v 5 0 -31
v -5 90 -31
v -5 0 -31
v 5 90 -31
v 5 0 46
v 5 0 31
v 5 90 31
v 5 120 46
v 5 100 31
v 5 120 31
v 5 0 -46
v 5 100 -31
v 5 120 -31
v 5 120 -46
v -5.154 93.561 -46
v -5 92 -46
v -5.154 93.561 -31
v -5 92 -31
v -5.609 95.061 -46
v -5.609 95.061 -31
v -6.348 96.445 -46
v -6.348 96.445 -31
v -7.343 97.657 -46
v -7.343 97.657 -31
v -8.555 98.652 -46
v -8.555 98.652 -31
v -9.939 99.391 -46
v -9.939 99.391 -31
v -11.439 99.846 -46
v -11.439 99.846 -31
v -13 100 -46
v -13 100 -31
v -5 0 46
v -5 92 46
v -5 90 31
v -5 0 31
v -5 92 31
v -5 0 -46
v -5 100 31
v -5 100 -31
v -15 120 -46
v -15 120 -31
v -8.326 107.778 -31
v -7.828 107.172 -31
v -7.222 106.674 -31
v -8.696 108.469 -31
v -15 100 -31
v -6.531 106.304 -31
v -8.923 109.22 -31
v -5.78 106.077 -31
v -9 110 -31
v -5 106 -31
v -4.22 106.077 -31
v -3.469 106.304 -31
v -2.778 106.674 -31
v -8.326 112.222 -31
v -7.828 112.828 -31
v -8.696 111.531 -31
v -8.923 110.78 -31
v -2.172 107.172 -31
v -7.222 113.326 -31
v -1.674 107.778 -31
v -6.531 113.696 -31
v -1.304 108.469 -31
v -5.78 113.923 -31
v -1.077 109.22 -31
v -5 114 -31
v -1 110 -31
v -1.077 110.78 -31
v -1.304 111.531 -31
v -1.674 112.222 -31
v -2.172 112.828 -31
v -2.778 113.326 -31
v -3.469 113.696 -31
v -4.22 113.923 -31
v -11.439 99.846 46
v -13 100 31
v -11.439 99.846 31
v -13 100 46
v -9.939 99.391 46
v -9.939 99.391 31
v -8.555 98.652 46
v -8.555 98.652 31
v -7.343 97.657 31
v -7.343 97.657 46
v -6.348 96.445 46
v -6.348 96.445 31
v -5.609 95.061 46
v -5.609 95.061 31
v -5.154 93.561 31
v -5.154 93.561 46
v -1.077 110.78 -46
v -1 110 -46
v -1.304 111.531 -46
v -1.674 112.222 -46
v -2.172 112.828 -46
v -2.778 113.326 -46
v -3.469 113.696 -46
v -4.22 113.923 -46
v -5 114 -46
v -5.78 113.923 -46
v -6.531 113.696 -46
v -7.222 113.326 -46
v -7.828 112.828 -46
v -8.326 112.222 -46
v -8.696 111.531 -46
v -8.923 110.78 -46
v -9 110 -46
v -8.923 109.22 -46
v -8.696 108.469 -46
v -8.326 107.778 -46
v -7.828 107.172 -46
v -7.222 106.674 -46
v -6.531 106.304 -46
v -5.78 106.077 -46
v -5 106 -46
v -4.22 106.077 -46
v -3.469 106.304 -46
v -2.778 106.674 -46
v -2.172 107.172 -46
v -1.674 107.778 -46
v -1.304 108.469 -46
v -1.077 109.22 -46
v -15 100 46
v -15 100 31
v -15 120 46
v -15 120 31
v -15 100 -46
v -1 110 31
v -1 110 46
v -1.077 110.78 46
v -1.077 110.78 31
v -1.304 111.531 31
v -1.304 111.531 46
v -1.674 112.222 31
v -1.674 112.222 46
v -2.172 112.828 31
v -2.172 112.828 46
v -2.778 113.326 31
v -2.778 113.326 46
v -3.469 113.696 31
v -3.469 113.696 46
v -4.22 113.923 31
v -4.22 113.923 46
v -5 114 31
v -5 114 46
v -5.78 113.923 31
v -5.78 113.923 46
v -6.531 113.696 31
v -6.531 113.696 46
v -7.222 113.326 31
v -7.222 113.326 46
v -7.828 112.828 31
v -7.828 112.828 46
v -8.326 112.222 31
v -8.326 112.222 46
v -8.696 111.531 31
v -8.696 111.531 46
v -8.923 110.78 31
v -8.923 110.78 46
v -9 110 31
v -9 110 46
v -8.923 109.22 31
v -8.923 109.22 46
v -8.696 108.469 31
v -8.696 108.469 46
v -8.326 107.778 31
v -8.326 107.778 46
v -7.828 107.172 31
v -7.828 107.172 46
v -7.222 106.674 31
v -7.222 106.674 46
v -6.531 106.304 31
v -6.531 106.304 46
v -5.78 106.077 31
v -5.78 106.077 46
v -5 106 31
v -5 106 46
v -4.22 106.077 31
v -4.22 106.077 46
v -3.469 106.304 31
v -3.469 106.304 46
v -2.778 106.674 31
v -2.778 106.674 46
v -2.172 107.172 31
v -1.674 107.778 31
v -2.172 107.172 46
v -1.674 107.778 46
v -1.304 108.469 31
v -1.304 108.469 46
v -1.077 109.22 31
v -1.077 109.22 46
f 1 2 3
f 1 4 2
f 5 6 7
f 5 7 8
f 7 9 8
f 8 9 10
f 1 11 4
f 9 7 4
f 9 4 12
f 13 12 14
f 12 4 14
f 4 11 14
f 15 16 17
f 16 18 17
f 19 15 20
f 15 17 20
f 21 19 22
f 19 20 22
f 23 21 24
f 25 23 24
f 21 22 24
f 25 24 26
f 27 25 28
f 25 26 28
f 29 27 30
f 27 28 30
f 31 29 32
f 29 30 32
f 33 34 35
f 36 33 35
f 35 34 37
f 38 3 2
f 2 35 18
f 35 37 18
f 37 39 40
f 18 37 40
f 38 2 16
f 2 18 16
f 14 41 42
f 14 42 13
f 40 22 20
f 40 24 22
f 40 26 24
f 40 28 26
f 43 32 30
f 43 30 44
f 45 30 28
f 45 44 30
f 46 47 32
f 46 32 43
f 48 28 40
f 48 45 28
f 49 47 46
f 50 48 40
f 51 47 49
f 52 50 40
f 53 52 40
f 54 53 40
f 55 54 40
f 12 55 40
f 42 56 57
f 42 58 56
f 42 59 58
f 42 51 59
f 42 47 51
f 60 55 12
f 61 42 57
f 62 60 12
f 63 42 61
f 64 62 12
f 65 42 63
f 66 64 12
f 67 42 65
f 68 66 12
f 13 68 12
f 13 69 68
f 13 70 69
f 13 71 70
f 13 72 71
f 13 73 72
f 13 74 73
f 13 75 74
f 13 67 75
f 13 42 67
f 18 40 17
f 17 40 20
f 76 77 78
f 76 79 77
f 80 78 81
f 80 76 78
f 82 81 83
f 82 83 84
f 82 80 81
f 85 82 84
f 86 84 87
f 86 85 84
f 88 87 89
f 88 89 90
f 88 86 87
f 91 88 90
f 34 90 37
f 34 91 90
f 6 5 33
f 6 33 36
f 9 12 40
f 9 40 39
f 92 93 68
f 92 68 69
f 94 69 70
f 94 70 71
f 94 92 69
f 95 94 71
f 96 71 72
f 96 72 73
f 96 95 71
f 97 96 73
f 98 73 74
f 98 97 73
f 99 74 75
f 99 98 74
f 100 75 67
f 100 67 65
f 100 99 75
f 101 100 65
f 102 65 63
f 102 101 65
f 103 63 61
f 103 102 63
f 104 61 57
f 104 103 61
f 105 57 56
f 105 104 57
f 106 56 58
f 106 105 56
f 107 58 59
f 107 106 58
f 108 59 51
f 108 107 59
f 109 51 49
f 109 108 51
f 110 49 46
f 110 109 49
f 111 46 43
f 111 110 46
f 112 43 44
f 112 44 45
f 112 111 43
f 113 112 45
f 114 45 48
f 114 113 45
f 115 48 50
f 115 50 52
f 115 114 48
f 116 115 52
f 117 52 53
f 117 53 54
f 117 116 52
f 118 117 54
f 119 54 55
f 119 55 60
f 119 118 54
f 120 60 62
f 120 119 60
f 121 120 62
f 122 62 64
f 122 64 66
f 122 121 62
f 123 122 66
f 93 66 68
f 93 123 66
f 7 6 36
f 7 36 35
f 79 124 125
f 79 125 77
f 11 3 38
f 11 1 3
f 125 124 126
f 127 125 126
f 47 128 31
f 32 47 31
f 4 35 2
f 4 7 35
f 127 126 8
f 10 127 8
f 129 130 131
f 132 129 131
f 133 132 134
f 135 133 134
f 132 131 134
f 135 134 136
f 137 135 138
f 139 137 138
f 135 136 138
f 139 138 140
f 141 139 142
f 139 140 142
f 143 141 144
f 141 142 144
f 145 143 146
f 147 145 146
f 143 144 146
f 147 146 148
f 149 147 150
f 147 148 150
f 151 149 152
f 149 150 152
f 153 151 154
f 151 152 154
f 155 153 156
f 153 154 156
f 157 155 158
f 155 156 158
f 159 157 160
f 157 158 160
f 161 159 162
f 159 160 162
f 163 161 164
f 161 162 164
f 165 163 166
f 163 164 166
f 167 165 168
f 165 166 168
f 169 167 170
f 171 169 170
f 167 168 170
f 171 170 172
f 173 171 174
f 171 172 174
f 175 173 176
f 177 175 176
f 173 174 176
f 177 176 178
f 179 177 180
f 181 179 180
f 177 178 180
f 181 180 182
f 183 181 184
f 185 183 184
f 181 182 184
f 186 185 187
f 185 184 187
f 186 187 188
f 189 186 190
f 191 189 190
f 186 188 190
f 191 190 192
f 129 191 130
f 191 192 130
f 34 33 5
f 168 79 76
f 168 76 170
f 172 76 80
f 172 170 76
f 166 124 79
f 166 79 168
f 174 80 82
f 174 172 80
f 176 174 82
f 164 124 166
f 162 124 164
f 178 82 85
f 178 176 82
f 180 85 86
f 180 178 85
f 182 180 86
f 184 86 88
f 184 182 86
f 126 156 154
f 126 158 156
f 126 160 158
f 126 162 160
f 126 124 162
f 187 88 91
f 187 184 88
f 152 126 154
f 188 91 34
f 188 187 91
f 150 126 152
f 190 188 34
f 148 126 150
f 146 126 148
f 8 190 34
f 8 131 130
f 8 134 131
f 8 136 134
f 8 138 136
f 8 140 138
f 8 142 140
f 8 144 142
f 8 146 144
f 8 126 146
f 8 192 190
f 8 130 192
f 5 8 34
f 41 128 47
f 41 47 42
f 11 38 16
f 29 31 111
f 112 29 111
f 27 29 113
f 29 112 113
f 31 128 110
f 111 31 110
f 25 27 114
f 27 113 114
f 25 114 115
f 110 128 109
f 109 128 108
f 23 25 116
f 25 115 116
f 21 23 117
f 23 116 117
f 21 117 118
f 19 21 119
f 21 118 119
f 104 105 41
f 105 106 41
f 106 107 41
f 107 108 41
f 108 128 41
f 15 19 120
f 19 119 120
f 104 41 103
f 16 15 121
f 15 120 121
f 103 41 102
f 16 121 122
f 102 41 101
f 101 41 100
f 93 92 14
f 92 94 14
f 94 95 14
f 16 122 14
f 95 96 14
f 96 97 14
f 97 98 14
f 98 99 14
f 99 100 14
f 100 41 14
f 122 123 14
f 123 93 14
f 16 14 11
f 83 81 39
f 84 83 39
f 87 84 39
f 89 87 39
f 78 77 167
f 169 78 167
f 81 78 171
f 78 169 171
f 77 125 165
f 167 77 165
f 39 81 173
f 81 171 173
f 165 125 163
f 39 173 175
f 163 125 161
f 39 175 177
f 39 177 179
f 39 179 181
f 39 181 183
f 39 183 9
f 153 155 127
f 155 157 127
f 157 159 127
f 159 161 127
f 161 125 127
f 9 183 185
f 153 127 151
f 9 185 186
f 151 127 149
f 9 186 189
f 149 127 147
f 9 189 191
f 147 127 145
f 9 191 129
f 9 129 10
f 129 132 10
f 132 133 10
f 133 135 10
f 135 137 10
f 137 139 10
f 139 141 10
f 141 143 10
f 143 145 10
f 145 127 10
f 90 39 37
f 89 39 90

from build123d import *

# Parameters (mm, degrees)
EXTRUDE_2_DEPTH = 5
SKETCH_5_W      = 20
SKETCH_5_H      = 20
SKETCH_5_R      = 4
EXTRUDE_3_DEPTH = 15
FILLET_1_R      = 8


with BuildPart() as part:
    # 草图3 → 凸台-拉伸2 (new, symmetric)
    with BuildSketch(Plane(origin=(0, 0, 0), x_dir=(0, 0, -1), z_dir=(1, 0, 0))):
        Polygon((31, 0), (46, 0), (46, 100), (-46, 100), (-46, 0), (-31, 0), (-31, 90), (31, 90), align=None)
    extrude(amount=EXTRUDE_2_DEPTH, both=True)

    # 草图5 → 凸台-拉伸3 (add)
    with BuildSketch(Plane.XY.offset(46)):
        with Locations((-5, 110)):
            Rectangle(SKETCH_5_W, SKETCH_5_H)
        with Locations((-5, 110)):
            Circle(SKETCH_5_R, mode=Mode.SUBTRACT)
    extrude_3 = extrude(amount=-EXTRUDE_3_DEPTH)

    # 镜向1: 凸台-拉伸3 across plane
    add(extrude_3.mirror(Plane.XY))

    # 圆角1
    fillet_1_edges = [part.edges().sort_by_distance(p)[0] for p in [
        (-5, 100, -38.5),
        (-5, 100, 38.5),
    ]]
    fillet(fillet_1_edges, radius=FILLET_1_R)


solid = part.part
